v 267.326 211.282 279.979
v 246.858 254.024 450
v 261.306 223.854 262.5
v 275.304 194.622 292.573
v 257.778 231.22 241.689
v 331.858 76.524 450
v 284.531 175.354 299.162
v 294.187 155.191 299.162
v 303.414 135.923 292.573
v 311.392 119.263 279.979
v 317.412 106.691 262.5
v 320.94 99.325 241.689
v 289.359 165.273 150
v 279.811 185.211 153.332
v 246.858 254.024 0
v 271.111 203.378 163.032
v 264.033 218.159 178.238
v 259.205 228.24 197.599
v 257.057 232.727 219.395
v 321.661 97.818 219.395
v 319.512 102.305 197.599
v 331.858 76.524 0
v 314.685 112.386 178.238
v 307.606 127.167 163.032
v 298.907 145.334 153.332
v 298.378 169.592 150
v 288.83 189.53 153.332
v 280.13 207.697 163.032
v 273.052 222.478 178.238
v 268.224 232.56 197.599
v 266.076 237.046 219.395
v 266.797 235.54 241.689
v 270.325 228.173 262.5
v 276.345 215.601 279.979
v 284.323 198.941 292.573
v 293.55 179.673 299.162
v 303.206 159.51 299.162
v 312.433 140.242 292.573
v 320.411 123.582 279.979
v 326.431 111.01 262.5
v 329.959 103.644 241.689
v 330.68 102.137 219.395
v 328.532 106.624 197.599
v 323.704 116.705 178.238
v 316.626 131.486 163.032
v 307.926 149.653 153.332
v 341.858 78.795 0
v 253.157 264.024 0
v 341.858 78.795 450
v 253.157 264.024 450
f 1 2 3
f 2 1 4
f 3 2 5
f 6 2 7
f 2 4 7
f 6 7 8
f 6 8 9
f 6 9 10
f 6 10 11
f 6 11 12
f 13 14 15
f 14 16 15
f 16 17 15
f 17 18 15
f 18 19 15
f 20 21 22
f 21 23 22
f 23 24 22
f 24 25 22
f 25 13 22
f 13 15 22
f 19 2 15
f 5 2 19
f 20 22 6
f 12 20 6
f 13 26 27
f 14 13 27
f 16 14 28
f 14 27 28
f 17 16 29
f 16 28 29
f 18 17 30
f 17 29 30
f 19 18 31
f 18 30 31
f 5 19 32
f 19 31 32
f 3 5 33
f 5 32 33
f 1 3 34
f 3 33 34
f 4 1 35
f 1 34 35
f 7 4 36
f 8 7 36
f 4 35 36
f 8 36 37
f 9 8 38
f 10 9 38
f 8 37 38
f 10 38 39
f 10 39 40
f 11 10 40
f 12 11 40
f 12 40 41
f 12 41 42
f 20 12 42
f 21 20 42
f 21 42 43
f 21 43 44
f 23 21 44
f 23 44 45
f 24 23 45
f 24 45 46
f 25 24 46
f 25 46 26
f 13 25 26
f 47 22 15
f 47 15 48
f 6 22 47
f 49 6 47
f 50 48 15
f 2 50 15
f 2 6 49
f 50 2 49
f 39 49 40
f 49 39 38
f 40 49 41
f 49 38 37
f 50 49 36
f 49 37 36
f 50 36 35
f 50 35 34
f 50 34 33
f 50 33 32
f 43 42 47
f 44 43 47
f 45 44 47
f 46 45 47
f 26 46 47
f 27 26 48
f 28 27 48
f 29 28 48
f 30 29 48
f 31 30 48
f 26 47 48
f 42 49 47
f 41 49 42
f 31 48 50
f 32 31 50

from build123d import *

# Parameters (mm, degrees)
AUFSATZ_LINEAR_AUSTRAGEN1_DEPTH  = 450
F_15_0_15_DURCHMESSER_BOHRUNG1_D = 150


with BuildPart() as part:
    # Skizze1 → Aufsatz-Linear austragen1 (new body)
    with BuildSketch(Plane.XY):
        Polygon((253.156995608, 264.02367356), (246.858259494, 254.02367356), (331.858259494, 76.52367356), (341.858259494, 78.794563683), align=None)
    extrude(amount=AUFSATZ_LINEAR_AUSTRAGEN1_DEPTH)

    # Ø15.0 (15) Durchmesser Bohrung1 (through all)
    with Locations(Plane(origin=(299.762083925, 143.548040189, 0), x_dir=(0, 0, 1), z_dir=(-0.901919134, -0.431904938, 0))):
        with Locations((225, 24.086944564)):
            Hole(F_15_0_15_DURCHMESSER_BOHRUNG1_D / 2)


solid = part.part
